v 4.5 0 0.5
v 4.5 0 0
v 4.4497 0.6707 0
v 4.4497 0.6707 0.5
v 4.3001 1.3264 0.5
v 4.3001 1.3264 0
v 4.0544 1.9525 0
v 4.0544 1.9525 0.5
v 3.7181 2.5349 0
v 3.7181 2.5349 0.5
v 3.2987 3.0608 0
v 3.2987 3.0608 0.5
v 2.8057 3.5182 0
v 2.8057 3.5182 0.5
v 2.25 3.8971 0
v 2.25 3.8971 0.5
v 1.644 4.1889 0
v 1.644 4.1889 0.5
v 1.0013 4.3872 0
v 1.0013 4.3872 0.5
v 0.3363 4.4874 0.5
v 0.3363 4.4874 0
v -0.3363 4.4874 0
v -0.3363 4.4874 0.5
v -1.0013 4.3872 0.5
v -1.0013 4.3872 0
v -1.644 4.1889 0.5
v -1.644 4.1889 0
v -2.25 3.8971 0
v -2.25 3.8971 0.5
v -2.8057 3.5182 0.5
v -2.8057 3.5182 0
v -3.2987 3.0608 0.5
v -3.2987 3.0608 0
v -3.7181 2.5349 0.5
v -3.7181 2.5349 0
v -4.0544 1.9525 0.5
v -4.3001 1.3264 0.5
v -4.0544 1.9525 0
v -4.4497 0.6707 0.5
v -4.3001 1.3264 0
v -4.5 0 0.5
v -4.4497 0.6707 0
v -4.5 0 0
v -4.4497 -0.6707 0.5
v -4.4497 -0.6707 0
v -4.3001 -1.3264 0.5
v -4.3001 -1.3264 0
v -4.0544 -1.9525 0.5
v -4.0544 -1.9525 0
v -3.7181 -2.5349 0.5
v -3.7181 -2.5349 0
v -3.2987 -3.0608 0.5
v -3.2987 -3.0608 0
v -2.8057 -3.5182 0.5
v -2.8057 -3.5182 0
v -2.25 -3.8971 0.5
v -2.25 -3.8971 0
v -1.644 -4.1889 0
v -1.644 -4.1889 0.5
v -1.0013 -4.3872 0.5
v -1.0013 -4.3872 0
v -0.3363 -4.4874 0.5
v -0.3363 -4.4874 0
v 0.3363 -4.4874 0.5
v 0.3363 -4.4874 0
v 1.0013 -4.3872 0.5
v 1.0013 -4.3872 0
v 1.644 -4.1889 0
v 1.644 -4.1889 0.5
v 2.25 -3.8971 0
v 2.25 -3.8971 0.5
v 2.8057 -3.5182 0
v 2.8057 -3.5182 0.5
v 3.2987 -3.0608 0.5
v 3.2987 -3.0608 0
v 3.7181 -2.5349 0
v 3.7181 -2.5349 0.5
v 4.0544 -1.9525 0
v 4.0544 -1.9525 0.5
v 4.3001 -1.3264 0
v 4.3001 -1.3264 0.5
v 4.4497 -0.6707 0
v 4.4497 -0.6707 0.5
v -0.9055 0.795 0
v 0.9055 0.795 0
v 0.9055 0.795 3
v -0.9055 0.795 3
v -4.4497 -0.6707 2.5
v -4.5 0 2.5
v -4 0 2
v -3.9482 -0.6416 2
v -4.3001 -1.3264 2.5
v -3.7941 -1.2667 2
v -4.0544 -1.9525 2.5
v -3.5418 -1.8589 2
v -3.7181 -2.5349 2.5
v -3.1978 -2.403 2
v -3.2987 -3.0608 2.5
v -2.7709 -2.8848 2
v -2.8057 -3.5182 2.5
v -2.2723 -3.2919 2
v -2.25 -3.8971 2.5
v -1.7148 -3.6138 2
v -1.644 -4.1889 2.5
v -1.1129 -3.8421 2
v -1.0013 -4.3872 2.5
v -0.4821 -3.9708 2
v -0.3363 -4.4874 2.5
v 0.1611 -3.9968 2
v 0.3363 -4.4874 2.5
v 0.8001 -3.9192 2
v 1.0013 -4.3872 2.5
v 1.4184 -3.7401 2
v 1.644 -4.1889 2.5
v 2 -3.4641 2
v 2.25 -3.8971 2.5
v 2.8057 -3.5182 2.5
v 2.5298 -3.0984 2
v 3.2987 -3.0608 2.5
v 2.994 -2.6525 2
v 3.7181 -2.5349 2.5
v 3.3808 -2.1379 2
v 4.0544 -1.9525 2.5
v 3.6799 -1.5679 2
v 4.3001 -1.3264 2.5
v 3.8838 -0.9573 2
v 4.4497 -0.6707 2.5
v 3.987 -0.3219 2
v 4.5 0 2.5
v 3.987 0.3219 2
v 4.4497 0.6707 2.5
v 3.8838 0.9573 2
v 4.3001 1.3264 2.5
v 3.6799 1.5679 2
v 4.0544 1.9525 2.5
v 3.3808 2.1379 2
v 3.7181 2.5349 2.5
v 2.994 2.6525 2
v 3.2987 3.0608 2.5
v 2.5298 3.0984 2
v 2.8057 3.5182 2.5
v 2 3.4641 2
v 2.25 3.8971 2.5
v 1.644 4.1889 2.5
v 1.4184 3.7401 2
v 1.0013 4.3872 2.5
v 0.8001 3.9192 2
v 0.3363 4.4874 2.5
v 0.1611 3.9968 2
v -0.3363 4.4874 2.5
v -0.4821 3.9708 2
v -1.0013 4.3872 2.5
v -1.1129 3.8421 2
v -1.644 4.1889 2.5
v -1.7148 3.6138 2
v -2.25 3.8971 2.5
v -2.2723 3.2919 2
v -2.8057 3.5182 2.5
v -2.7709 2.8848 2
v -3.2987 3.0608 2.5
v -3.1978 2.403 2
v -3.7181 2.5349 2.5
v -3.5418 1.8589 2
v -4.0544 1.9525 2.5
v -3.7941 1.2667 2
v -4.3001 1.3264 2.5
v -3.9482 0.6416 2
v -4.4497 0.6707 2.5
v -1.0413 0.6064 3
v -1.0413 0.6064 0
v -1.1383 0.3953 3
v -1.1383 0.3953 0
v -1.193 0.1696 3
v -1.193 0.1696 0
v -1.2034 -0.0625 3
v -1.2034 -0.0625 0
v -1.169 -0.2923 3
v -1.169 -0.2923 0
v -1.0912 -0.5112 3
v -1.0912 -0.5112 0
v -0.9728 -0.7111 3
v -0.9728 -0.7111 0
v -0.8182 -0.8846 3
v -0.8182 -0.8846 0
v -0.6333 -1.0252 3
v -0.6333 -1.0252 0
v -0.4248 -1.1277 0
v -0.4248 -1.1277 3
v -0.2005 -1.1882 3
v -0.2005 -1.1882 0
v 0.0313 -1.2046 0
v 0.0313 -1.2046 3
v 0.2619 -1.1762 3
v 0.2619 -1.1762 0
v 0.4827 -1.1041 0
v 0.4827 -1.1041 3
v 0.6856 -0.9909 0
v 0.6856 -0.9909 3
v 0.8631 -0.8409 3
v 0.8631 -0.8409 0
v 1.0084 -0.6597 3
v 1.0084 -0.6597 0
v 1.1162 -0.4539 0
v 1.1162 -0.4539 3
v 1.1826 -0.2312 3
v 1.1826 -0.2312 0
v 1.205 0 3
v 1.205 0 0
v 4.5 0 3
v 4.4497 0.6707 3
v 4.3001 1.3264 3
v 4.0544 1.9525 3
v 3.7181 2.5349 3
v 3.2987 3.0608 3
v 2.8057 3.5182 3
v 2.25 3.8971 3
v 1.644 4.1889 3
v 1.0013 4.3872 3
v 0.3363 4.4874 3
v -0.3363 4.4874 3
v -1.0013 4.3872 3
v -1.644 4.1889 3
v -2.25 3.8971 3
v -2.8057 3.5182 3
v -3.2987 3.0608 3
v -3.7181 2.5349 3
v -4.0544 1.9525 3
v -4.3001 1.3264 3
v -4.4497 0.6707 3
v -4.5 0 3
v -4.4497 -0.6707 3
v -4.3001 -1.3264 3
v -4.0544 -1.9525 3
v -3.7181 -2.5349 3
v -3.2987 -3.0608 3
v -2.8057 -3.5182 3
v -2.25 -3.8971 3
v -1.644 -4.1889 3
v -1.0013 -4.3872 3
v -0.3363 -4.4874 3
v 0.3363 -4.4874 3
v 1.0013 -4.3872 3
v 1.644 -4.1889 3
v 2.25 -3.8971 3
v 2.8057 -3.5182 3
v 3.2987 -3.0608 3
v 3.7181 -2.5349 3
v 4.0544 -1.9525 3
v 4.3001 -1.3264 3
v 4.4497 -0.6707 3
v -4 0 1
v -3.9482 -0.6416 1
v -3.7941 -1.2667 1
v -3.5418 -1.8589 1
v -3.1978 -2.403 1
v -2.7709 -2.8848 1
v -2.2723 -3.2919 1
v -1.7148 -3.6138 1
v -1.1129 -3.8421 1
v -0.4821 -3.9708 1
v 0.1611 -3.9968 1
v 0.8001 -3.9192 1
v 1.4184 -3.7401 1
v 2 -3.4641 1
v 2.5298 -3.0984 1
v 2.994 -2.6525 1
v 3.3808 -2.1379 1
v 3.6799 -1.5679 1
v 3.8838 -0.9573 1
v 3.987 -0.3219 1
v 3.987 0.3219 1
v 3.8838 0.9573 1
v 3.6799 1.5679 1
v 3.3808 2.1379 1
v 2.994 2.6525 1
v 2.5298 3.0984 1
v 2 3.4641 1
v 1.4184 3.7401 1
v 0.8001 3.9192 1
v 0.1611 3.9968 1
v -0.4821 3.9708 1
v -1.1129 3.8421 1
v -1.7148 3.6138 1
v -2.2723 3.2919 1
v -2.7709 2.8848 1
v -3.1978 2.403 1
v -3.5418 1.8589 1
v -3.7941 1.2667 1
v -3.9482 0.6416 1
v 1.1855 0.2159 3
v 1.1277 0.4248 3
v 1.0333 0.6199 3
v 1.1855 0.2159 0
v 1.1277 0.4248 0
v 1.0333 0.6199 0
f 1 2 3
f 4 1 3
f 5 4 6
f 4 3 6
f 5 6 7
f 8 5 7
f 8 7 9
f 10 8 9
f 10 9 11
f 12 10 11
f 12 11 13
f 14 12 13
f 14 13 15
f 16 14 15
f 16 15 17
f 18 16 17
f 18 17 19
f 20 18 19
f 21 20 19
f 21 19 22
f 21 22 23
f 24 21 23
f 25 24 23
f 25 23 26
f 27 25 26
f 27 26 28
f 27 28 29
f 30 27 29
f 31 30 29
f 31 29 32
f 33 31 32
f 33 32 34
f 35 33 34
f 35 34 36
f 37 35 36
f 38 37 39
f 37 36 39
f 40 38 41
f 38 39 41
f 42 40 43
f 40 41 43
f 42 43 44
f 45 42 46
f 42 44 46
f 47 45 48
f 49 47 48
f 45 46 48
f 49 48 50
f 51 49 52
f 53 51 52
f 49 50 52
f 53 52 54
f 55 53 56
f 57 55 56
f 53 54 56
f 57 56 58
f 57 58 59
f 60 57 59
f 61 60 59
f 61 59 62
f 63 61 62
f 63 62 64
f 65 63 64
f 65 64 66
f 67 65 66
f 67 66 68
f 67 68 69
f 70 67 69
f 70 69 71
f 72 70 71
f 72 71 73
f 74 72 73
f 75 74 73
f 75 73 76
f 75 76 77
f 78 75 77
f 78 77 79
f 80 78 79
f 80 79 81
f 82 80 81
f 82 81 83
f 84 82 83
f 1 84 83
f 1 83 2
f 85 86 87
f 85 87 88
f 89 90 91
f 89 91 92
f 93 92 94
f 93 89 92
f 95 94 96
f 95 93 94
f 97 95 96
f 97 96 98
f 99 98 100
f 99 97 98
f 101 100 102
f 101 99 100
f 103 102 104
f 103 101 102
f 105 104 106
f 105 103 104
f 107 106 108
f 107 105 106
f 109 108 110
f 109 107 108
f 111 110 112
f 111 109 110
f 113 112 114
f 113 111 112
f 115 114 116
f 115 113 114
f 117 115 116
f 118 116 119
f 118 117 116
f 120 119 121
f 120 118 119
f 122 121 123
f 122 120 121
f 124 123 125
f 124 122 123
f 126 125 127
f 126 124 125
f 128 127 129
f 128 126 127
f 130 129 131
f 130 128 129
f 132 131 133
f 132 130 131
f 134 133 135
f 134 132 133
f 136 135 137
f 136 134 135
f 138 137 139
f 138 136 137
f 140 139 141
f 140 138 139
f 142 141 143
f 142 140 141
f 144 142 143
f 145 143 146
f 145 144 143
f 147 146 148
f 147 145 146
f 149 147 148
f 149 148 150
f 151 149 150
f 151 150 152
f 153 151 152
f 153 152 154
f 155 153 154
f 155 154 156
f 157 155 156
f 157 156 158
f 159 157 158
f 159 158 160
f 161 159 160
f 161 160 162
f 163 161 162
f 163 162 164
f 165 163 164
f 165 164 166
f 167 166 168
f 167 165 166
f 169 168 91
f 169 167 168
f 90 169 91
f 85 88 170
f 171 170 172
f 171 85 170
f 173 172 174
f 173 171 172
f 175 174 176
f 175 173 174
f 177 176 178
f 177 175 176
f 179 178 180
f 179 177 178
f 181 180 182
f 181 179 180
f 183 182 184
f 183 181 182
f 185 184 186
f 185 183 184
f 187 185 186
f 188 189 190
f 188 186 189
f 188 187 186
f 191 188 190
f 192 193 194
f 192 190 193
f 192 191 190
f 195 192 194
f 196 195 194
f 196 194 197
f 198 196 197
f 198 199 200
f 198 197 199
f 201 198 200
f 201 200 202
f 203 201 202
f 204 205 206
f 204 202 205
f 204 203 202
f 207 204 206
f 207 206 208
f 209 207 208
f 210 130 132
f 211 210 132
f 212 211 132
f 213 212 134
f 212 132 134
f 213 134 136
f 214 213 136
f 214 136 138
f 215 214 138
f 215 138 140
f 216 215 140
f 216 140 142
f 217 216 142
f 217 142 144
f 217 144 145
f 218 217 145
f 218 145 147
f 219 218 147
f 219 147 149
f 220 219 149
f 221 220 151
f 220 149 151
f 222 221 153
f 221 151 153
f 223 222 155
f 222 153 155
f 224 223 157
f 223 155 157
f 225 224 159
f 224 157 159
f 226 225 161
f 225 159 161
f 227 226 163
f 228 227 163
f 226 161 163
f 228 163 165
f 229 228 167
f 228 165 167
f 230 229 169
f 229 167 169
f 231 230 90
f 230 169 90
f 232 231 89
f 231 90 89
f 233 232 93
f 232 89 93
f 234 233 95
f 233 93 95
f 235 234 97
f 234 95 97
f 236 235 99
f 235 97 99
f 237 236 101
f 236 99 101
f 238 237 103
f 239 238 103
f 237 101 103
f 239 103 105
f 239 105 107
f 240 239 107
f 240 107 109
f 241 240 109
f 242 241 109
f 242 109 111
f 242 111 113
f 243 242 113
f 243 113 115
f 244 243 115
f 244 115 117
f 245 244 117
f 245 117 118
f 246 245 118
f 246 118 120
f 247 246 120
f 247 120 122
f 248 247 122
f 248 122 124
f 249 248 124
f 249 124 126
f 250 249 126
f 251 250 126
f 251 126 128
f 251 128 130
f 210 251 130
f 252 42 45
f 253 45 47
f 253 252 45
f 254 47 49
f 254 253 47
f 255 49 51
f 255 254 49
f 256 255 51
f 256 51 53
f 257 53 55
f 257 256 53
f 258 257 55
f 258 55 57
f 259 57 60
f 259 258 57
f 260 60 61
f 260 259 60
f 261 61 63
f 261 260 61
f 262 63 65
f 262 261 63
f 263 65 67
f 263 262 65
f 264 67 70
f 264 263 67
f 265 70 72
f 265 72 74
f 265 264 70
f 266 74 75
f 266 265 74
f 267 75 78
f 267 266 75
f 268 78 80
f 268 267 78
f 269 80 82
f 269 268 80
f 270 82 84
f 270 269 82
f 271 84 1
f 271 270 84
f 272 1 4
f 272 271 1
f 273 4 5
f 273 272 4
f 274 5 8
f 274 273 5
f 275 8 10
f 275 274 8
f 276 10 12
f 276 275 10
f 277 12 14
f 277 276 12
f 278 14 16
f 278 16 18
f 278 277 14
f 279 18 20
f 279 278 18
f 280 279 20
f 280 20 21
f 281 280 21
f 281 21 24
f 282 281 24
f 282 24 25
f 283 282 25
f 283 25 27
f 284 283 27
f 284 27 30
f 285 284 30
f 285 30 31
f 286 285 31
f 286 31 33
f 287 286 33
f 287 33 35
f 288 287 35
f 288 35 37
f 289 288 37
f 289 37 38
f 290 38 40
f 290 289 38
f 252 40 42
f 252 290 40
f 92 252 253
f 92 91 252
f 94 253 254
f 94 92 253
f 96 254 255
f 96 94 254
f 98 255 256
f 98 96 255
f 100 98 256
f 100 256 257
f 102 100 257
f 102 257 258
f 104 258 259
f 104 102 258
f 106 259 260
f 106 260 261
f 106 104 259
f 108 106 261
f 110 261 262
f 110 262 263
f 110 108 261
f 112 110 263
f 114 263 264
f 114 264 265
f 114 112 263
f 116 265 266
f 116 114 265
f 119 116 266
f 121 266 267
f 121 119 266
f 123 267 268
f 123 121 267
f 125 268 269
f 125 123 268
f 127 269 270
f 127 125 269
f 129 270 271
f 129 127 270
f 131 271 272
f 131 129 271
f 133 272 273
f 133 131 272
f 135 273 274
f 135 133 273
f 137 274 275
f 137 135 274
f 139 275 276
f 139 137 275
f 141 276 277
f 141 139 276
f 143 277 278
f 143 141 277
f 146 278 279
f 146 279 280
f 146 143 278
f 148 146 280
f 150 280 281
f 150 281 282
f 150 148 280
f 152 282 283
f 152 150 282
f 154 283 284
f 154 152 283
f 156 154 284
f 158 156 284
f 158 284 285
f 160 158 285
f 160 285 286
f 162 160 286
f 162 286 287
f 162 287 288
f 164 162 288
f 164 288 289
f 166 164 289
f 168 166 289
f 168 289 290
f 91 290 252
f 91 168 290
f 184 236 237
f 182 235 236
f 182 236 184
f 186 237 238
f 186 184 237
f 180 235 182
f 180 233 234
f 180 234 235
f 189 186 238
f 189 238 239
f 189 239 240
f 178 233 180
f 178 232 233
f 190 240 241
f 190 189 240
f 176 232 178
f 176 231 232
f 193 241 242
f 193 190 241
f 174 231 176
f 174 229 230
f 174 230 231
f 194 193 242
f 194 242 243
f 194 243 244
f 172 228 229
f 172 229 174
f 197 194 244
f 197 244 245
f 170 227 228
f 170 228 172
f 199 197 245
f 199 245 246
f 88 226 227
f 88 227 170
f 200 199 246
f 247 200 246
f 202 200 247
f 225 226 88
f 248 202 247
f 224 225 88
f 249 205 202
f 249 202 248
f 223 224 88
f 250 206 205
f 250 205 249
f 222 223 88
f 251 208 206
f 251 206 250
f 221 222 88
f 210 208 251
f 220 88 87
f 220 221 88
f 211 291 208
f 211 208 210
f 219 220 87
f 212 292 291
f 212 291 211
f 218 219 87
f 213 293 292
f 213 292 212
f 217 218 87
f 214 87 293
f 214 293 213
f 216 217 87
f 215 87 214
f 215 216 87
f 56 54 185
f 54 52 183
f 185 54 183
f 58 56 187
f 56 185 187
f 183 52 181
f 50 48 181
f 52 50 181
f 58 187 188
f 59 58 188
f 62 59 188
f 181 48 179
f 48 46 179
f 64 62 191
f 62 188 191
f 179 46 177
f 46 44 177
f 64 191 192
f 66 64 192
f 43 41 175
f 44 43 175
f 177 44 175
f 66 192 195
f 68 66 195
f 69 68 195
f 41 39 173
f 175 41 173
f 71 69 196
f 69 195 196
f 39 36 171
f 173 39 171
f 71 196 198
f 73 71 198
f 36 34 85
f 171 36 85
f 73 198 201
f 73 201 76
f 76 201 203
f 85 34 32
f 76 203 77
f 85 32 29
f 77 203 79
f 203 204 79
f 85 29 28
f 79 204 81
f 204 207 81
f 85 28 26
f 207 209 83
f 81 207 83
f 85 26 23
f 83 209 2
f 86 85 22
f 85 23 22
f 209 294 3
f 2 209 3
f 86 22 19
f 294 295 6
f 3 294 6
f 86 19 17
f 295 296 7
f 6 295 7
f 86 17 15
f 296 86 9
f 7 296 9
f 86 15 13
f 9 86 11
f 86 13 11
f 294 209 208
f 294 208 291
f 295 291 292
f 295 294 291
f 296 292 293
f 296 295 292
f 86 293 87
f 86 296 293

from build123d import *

# Parameters (mm, degrees)
SKETCH1_R                 = 4.5
MAIN_BASE_DEPTH           = 3
MOTOR_SHAFT_CUT_OUT_DEPTH = 8.03562364


with BuildPart() as part:
    # Sketch1 → main_base (new body)
    with BuildSketch(Plane.XY):
        Circle(SKETCH1_R)
    extrude(amount=MAIN_BASE_DEPTH)

    # Sketch2 → pulley_cut_out (revolve, cut)
    with BuildSketch(Plane(origin=(0, 0, 0), x_dir=(0, 0, -1), z_dir=(1, 0, 0)), mode=Mode.PRIVATE) as pulley_cut_out_sk:
        Polygon((-2.5, 4.5), (-0.5, 4.5), (-1, 4), (-2, 4), align=None)
    revolve(pulley_cut_out_sk.sketch.rotate(Axis((0, 0, 0), (0, 0, 1)), 90), axis=Axis((0, 0, 0), (0, 0, 1)), mode=Mode.SUBTRACT)

    # Sketch3 → motor_shaft_cut_out (cut, through all)
    with BuildSketch(Plane.XY):
        with BuildLine():
            ThreePointArc((1.205, 0), (1.127652187, 0.424765283), (0.905538514, 0.795))
            Line((0.905538514, 0.795), (-0.905538514, 0.795))
            ThreePointArc((-0.905538514, 0.795), (-0.424765283, -1.127652187), (1.205, 0))
        make_face()
    extrude(amount=MOTOR_SHAFT_CUT_OUT_DEPTH, mode=Mode.SUBTRACT)


solid = part.part
